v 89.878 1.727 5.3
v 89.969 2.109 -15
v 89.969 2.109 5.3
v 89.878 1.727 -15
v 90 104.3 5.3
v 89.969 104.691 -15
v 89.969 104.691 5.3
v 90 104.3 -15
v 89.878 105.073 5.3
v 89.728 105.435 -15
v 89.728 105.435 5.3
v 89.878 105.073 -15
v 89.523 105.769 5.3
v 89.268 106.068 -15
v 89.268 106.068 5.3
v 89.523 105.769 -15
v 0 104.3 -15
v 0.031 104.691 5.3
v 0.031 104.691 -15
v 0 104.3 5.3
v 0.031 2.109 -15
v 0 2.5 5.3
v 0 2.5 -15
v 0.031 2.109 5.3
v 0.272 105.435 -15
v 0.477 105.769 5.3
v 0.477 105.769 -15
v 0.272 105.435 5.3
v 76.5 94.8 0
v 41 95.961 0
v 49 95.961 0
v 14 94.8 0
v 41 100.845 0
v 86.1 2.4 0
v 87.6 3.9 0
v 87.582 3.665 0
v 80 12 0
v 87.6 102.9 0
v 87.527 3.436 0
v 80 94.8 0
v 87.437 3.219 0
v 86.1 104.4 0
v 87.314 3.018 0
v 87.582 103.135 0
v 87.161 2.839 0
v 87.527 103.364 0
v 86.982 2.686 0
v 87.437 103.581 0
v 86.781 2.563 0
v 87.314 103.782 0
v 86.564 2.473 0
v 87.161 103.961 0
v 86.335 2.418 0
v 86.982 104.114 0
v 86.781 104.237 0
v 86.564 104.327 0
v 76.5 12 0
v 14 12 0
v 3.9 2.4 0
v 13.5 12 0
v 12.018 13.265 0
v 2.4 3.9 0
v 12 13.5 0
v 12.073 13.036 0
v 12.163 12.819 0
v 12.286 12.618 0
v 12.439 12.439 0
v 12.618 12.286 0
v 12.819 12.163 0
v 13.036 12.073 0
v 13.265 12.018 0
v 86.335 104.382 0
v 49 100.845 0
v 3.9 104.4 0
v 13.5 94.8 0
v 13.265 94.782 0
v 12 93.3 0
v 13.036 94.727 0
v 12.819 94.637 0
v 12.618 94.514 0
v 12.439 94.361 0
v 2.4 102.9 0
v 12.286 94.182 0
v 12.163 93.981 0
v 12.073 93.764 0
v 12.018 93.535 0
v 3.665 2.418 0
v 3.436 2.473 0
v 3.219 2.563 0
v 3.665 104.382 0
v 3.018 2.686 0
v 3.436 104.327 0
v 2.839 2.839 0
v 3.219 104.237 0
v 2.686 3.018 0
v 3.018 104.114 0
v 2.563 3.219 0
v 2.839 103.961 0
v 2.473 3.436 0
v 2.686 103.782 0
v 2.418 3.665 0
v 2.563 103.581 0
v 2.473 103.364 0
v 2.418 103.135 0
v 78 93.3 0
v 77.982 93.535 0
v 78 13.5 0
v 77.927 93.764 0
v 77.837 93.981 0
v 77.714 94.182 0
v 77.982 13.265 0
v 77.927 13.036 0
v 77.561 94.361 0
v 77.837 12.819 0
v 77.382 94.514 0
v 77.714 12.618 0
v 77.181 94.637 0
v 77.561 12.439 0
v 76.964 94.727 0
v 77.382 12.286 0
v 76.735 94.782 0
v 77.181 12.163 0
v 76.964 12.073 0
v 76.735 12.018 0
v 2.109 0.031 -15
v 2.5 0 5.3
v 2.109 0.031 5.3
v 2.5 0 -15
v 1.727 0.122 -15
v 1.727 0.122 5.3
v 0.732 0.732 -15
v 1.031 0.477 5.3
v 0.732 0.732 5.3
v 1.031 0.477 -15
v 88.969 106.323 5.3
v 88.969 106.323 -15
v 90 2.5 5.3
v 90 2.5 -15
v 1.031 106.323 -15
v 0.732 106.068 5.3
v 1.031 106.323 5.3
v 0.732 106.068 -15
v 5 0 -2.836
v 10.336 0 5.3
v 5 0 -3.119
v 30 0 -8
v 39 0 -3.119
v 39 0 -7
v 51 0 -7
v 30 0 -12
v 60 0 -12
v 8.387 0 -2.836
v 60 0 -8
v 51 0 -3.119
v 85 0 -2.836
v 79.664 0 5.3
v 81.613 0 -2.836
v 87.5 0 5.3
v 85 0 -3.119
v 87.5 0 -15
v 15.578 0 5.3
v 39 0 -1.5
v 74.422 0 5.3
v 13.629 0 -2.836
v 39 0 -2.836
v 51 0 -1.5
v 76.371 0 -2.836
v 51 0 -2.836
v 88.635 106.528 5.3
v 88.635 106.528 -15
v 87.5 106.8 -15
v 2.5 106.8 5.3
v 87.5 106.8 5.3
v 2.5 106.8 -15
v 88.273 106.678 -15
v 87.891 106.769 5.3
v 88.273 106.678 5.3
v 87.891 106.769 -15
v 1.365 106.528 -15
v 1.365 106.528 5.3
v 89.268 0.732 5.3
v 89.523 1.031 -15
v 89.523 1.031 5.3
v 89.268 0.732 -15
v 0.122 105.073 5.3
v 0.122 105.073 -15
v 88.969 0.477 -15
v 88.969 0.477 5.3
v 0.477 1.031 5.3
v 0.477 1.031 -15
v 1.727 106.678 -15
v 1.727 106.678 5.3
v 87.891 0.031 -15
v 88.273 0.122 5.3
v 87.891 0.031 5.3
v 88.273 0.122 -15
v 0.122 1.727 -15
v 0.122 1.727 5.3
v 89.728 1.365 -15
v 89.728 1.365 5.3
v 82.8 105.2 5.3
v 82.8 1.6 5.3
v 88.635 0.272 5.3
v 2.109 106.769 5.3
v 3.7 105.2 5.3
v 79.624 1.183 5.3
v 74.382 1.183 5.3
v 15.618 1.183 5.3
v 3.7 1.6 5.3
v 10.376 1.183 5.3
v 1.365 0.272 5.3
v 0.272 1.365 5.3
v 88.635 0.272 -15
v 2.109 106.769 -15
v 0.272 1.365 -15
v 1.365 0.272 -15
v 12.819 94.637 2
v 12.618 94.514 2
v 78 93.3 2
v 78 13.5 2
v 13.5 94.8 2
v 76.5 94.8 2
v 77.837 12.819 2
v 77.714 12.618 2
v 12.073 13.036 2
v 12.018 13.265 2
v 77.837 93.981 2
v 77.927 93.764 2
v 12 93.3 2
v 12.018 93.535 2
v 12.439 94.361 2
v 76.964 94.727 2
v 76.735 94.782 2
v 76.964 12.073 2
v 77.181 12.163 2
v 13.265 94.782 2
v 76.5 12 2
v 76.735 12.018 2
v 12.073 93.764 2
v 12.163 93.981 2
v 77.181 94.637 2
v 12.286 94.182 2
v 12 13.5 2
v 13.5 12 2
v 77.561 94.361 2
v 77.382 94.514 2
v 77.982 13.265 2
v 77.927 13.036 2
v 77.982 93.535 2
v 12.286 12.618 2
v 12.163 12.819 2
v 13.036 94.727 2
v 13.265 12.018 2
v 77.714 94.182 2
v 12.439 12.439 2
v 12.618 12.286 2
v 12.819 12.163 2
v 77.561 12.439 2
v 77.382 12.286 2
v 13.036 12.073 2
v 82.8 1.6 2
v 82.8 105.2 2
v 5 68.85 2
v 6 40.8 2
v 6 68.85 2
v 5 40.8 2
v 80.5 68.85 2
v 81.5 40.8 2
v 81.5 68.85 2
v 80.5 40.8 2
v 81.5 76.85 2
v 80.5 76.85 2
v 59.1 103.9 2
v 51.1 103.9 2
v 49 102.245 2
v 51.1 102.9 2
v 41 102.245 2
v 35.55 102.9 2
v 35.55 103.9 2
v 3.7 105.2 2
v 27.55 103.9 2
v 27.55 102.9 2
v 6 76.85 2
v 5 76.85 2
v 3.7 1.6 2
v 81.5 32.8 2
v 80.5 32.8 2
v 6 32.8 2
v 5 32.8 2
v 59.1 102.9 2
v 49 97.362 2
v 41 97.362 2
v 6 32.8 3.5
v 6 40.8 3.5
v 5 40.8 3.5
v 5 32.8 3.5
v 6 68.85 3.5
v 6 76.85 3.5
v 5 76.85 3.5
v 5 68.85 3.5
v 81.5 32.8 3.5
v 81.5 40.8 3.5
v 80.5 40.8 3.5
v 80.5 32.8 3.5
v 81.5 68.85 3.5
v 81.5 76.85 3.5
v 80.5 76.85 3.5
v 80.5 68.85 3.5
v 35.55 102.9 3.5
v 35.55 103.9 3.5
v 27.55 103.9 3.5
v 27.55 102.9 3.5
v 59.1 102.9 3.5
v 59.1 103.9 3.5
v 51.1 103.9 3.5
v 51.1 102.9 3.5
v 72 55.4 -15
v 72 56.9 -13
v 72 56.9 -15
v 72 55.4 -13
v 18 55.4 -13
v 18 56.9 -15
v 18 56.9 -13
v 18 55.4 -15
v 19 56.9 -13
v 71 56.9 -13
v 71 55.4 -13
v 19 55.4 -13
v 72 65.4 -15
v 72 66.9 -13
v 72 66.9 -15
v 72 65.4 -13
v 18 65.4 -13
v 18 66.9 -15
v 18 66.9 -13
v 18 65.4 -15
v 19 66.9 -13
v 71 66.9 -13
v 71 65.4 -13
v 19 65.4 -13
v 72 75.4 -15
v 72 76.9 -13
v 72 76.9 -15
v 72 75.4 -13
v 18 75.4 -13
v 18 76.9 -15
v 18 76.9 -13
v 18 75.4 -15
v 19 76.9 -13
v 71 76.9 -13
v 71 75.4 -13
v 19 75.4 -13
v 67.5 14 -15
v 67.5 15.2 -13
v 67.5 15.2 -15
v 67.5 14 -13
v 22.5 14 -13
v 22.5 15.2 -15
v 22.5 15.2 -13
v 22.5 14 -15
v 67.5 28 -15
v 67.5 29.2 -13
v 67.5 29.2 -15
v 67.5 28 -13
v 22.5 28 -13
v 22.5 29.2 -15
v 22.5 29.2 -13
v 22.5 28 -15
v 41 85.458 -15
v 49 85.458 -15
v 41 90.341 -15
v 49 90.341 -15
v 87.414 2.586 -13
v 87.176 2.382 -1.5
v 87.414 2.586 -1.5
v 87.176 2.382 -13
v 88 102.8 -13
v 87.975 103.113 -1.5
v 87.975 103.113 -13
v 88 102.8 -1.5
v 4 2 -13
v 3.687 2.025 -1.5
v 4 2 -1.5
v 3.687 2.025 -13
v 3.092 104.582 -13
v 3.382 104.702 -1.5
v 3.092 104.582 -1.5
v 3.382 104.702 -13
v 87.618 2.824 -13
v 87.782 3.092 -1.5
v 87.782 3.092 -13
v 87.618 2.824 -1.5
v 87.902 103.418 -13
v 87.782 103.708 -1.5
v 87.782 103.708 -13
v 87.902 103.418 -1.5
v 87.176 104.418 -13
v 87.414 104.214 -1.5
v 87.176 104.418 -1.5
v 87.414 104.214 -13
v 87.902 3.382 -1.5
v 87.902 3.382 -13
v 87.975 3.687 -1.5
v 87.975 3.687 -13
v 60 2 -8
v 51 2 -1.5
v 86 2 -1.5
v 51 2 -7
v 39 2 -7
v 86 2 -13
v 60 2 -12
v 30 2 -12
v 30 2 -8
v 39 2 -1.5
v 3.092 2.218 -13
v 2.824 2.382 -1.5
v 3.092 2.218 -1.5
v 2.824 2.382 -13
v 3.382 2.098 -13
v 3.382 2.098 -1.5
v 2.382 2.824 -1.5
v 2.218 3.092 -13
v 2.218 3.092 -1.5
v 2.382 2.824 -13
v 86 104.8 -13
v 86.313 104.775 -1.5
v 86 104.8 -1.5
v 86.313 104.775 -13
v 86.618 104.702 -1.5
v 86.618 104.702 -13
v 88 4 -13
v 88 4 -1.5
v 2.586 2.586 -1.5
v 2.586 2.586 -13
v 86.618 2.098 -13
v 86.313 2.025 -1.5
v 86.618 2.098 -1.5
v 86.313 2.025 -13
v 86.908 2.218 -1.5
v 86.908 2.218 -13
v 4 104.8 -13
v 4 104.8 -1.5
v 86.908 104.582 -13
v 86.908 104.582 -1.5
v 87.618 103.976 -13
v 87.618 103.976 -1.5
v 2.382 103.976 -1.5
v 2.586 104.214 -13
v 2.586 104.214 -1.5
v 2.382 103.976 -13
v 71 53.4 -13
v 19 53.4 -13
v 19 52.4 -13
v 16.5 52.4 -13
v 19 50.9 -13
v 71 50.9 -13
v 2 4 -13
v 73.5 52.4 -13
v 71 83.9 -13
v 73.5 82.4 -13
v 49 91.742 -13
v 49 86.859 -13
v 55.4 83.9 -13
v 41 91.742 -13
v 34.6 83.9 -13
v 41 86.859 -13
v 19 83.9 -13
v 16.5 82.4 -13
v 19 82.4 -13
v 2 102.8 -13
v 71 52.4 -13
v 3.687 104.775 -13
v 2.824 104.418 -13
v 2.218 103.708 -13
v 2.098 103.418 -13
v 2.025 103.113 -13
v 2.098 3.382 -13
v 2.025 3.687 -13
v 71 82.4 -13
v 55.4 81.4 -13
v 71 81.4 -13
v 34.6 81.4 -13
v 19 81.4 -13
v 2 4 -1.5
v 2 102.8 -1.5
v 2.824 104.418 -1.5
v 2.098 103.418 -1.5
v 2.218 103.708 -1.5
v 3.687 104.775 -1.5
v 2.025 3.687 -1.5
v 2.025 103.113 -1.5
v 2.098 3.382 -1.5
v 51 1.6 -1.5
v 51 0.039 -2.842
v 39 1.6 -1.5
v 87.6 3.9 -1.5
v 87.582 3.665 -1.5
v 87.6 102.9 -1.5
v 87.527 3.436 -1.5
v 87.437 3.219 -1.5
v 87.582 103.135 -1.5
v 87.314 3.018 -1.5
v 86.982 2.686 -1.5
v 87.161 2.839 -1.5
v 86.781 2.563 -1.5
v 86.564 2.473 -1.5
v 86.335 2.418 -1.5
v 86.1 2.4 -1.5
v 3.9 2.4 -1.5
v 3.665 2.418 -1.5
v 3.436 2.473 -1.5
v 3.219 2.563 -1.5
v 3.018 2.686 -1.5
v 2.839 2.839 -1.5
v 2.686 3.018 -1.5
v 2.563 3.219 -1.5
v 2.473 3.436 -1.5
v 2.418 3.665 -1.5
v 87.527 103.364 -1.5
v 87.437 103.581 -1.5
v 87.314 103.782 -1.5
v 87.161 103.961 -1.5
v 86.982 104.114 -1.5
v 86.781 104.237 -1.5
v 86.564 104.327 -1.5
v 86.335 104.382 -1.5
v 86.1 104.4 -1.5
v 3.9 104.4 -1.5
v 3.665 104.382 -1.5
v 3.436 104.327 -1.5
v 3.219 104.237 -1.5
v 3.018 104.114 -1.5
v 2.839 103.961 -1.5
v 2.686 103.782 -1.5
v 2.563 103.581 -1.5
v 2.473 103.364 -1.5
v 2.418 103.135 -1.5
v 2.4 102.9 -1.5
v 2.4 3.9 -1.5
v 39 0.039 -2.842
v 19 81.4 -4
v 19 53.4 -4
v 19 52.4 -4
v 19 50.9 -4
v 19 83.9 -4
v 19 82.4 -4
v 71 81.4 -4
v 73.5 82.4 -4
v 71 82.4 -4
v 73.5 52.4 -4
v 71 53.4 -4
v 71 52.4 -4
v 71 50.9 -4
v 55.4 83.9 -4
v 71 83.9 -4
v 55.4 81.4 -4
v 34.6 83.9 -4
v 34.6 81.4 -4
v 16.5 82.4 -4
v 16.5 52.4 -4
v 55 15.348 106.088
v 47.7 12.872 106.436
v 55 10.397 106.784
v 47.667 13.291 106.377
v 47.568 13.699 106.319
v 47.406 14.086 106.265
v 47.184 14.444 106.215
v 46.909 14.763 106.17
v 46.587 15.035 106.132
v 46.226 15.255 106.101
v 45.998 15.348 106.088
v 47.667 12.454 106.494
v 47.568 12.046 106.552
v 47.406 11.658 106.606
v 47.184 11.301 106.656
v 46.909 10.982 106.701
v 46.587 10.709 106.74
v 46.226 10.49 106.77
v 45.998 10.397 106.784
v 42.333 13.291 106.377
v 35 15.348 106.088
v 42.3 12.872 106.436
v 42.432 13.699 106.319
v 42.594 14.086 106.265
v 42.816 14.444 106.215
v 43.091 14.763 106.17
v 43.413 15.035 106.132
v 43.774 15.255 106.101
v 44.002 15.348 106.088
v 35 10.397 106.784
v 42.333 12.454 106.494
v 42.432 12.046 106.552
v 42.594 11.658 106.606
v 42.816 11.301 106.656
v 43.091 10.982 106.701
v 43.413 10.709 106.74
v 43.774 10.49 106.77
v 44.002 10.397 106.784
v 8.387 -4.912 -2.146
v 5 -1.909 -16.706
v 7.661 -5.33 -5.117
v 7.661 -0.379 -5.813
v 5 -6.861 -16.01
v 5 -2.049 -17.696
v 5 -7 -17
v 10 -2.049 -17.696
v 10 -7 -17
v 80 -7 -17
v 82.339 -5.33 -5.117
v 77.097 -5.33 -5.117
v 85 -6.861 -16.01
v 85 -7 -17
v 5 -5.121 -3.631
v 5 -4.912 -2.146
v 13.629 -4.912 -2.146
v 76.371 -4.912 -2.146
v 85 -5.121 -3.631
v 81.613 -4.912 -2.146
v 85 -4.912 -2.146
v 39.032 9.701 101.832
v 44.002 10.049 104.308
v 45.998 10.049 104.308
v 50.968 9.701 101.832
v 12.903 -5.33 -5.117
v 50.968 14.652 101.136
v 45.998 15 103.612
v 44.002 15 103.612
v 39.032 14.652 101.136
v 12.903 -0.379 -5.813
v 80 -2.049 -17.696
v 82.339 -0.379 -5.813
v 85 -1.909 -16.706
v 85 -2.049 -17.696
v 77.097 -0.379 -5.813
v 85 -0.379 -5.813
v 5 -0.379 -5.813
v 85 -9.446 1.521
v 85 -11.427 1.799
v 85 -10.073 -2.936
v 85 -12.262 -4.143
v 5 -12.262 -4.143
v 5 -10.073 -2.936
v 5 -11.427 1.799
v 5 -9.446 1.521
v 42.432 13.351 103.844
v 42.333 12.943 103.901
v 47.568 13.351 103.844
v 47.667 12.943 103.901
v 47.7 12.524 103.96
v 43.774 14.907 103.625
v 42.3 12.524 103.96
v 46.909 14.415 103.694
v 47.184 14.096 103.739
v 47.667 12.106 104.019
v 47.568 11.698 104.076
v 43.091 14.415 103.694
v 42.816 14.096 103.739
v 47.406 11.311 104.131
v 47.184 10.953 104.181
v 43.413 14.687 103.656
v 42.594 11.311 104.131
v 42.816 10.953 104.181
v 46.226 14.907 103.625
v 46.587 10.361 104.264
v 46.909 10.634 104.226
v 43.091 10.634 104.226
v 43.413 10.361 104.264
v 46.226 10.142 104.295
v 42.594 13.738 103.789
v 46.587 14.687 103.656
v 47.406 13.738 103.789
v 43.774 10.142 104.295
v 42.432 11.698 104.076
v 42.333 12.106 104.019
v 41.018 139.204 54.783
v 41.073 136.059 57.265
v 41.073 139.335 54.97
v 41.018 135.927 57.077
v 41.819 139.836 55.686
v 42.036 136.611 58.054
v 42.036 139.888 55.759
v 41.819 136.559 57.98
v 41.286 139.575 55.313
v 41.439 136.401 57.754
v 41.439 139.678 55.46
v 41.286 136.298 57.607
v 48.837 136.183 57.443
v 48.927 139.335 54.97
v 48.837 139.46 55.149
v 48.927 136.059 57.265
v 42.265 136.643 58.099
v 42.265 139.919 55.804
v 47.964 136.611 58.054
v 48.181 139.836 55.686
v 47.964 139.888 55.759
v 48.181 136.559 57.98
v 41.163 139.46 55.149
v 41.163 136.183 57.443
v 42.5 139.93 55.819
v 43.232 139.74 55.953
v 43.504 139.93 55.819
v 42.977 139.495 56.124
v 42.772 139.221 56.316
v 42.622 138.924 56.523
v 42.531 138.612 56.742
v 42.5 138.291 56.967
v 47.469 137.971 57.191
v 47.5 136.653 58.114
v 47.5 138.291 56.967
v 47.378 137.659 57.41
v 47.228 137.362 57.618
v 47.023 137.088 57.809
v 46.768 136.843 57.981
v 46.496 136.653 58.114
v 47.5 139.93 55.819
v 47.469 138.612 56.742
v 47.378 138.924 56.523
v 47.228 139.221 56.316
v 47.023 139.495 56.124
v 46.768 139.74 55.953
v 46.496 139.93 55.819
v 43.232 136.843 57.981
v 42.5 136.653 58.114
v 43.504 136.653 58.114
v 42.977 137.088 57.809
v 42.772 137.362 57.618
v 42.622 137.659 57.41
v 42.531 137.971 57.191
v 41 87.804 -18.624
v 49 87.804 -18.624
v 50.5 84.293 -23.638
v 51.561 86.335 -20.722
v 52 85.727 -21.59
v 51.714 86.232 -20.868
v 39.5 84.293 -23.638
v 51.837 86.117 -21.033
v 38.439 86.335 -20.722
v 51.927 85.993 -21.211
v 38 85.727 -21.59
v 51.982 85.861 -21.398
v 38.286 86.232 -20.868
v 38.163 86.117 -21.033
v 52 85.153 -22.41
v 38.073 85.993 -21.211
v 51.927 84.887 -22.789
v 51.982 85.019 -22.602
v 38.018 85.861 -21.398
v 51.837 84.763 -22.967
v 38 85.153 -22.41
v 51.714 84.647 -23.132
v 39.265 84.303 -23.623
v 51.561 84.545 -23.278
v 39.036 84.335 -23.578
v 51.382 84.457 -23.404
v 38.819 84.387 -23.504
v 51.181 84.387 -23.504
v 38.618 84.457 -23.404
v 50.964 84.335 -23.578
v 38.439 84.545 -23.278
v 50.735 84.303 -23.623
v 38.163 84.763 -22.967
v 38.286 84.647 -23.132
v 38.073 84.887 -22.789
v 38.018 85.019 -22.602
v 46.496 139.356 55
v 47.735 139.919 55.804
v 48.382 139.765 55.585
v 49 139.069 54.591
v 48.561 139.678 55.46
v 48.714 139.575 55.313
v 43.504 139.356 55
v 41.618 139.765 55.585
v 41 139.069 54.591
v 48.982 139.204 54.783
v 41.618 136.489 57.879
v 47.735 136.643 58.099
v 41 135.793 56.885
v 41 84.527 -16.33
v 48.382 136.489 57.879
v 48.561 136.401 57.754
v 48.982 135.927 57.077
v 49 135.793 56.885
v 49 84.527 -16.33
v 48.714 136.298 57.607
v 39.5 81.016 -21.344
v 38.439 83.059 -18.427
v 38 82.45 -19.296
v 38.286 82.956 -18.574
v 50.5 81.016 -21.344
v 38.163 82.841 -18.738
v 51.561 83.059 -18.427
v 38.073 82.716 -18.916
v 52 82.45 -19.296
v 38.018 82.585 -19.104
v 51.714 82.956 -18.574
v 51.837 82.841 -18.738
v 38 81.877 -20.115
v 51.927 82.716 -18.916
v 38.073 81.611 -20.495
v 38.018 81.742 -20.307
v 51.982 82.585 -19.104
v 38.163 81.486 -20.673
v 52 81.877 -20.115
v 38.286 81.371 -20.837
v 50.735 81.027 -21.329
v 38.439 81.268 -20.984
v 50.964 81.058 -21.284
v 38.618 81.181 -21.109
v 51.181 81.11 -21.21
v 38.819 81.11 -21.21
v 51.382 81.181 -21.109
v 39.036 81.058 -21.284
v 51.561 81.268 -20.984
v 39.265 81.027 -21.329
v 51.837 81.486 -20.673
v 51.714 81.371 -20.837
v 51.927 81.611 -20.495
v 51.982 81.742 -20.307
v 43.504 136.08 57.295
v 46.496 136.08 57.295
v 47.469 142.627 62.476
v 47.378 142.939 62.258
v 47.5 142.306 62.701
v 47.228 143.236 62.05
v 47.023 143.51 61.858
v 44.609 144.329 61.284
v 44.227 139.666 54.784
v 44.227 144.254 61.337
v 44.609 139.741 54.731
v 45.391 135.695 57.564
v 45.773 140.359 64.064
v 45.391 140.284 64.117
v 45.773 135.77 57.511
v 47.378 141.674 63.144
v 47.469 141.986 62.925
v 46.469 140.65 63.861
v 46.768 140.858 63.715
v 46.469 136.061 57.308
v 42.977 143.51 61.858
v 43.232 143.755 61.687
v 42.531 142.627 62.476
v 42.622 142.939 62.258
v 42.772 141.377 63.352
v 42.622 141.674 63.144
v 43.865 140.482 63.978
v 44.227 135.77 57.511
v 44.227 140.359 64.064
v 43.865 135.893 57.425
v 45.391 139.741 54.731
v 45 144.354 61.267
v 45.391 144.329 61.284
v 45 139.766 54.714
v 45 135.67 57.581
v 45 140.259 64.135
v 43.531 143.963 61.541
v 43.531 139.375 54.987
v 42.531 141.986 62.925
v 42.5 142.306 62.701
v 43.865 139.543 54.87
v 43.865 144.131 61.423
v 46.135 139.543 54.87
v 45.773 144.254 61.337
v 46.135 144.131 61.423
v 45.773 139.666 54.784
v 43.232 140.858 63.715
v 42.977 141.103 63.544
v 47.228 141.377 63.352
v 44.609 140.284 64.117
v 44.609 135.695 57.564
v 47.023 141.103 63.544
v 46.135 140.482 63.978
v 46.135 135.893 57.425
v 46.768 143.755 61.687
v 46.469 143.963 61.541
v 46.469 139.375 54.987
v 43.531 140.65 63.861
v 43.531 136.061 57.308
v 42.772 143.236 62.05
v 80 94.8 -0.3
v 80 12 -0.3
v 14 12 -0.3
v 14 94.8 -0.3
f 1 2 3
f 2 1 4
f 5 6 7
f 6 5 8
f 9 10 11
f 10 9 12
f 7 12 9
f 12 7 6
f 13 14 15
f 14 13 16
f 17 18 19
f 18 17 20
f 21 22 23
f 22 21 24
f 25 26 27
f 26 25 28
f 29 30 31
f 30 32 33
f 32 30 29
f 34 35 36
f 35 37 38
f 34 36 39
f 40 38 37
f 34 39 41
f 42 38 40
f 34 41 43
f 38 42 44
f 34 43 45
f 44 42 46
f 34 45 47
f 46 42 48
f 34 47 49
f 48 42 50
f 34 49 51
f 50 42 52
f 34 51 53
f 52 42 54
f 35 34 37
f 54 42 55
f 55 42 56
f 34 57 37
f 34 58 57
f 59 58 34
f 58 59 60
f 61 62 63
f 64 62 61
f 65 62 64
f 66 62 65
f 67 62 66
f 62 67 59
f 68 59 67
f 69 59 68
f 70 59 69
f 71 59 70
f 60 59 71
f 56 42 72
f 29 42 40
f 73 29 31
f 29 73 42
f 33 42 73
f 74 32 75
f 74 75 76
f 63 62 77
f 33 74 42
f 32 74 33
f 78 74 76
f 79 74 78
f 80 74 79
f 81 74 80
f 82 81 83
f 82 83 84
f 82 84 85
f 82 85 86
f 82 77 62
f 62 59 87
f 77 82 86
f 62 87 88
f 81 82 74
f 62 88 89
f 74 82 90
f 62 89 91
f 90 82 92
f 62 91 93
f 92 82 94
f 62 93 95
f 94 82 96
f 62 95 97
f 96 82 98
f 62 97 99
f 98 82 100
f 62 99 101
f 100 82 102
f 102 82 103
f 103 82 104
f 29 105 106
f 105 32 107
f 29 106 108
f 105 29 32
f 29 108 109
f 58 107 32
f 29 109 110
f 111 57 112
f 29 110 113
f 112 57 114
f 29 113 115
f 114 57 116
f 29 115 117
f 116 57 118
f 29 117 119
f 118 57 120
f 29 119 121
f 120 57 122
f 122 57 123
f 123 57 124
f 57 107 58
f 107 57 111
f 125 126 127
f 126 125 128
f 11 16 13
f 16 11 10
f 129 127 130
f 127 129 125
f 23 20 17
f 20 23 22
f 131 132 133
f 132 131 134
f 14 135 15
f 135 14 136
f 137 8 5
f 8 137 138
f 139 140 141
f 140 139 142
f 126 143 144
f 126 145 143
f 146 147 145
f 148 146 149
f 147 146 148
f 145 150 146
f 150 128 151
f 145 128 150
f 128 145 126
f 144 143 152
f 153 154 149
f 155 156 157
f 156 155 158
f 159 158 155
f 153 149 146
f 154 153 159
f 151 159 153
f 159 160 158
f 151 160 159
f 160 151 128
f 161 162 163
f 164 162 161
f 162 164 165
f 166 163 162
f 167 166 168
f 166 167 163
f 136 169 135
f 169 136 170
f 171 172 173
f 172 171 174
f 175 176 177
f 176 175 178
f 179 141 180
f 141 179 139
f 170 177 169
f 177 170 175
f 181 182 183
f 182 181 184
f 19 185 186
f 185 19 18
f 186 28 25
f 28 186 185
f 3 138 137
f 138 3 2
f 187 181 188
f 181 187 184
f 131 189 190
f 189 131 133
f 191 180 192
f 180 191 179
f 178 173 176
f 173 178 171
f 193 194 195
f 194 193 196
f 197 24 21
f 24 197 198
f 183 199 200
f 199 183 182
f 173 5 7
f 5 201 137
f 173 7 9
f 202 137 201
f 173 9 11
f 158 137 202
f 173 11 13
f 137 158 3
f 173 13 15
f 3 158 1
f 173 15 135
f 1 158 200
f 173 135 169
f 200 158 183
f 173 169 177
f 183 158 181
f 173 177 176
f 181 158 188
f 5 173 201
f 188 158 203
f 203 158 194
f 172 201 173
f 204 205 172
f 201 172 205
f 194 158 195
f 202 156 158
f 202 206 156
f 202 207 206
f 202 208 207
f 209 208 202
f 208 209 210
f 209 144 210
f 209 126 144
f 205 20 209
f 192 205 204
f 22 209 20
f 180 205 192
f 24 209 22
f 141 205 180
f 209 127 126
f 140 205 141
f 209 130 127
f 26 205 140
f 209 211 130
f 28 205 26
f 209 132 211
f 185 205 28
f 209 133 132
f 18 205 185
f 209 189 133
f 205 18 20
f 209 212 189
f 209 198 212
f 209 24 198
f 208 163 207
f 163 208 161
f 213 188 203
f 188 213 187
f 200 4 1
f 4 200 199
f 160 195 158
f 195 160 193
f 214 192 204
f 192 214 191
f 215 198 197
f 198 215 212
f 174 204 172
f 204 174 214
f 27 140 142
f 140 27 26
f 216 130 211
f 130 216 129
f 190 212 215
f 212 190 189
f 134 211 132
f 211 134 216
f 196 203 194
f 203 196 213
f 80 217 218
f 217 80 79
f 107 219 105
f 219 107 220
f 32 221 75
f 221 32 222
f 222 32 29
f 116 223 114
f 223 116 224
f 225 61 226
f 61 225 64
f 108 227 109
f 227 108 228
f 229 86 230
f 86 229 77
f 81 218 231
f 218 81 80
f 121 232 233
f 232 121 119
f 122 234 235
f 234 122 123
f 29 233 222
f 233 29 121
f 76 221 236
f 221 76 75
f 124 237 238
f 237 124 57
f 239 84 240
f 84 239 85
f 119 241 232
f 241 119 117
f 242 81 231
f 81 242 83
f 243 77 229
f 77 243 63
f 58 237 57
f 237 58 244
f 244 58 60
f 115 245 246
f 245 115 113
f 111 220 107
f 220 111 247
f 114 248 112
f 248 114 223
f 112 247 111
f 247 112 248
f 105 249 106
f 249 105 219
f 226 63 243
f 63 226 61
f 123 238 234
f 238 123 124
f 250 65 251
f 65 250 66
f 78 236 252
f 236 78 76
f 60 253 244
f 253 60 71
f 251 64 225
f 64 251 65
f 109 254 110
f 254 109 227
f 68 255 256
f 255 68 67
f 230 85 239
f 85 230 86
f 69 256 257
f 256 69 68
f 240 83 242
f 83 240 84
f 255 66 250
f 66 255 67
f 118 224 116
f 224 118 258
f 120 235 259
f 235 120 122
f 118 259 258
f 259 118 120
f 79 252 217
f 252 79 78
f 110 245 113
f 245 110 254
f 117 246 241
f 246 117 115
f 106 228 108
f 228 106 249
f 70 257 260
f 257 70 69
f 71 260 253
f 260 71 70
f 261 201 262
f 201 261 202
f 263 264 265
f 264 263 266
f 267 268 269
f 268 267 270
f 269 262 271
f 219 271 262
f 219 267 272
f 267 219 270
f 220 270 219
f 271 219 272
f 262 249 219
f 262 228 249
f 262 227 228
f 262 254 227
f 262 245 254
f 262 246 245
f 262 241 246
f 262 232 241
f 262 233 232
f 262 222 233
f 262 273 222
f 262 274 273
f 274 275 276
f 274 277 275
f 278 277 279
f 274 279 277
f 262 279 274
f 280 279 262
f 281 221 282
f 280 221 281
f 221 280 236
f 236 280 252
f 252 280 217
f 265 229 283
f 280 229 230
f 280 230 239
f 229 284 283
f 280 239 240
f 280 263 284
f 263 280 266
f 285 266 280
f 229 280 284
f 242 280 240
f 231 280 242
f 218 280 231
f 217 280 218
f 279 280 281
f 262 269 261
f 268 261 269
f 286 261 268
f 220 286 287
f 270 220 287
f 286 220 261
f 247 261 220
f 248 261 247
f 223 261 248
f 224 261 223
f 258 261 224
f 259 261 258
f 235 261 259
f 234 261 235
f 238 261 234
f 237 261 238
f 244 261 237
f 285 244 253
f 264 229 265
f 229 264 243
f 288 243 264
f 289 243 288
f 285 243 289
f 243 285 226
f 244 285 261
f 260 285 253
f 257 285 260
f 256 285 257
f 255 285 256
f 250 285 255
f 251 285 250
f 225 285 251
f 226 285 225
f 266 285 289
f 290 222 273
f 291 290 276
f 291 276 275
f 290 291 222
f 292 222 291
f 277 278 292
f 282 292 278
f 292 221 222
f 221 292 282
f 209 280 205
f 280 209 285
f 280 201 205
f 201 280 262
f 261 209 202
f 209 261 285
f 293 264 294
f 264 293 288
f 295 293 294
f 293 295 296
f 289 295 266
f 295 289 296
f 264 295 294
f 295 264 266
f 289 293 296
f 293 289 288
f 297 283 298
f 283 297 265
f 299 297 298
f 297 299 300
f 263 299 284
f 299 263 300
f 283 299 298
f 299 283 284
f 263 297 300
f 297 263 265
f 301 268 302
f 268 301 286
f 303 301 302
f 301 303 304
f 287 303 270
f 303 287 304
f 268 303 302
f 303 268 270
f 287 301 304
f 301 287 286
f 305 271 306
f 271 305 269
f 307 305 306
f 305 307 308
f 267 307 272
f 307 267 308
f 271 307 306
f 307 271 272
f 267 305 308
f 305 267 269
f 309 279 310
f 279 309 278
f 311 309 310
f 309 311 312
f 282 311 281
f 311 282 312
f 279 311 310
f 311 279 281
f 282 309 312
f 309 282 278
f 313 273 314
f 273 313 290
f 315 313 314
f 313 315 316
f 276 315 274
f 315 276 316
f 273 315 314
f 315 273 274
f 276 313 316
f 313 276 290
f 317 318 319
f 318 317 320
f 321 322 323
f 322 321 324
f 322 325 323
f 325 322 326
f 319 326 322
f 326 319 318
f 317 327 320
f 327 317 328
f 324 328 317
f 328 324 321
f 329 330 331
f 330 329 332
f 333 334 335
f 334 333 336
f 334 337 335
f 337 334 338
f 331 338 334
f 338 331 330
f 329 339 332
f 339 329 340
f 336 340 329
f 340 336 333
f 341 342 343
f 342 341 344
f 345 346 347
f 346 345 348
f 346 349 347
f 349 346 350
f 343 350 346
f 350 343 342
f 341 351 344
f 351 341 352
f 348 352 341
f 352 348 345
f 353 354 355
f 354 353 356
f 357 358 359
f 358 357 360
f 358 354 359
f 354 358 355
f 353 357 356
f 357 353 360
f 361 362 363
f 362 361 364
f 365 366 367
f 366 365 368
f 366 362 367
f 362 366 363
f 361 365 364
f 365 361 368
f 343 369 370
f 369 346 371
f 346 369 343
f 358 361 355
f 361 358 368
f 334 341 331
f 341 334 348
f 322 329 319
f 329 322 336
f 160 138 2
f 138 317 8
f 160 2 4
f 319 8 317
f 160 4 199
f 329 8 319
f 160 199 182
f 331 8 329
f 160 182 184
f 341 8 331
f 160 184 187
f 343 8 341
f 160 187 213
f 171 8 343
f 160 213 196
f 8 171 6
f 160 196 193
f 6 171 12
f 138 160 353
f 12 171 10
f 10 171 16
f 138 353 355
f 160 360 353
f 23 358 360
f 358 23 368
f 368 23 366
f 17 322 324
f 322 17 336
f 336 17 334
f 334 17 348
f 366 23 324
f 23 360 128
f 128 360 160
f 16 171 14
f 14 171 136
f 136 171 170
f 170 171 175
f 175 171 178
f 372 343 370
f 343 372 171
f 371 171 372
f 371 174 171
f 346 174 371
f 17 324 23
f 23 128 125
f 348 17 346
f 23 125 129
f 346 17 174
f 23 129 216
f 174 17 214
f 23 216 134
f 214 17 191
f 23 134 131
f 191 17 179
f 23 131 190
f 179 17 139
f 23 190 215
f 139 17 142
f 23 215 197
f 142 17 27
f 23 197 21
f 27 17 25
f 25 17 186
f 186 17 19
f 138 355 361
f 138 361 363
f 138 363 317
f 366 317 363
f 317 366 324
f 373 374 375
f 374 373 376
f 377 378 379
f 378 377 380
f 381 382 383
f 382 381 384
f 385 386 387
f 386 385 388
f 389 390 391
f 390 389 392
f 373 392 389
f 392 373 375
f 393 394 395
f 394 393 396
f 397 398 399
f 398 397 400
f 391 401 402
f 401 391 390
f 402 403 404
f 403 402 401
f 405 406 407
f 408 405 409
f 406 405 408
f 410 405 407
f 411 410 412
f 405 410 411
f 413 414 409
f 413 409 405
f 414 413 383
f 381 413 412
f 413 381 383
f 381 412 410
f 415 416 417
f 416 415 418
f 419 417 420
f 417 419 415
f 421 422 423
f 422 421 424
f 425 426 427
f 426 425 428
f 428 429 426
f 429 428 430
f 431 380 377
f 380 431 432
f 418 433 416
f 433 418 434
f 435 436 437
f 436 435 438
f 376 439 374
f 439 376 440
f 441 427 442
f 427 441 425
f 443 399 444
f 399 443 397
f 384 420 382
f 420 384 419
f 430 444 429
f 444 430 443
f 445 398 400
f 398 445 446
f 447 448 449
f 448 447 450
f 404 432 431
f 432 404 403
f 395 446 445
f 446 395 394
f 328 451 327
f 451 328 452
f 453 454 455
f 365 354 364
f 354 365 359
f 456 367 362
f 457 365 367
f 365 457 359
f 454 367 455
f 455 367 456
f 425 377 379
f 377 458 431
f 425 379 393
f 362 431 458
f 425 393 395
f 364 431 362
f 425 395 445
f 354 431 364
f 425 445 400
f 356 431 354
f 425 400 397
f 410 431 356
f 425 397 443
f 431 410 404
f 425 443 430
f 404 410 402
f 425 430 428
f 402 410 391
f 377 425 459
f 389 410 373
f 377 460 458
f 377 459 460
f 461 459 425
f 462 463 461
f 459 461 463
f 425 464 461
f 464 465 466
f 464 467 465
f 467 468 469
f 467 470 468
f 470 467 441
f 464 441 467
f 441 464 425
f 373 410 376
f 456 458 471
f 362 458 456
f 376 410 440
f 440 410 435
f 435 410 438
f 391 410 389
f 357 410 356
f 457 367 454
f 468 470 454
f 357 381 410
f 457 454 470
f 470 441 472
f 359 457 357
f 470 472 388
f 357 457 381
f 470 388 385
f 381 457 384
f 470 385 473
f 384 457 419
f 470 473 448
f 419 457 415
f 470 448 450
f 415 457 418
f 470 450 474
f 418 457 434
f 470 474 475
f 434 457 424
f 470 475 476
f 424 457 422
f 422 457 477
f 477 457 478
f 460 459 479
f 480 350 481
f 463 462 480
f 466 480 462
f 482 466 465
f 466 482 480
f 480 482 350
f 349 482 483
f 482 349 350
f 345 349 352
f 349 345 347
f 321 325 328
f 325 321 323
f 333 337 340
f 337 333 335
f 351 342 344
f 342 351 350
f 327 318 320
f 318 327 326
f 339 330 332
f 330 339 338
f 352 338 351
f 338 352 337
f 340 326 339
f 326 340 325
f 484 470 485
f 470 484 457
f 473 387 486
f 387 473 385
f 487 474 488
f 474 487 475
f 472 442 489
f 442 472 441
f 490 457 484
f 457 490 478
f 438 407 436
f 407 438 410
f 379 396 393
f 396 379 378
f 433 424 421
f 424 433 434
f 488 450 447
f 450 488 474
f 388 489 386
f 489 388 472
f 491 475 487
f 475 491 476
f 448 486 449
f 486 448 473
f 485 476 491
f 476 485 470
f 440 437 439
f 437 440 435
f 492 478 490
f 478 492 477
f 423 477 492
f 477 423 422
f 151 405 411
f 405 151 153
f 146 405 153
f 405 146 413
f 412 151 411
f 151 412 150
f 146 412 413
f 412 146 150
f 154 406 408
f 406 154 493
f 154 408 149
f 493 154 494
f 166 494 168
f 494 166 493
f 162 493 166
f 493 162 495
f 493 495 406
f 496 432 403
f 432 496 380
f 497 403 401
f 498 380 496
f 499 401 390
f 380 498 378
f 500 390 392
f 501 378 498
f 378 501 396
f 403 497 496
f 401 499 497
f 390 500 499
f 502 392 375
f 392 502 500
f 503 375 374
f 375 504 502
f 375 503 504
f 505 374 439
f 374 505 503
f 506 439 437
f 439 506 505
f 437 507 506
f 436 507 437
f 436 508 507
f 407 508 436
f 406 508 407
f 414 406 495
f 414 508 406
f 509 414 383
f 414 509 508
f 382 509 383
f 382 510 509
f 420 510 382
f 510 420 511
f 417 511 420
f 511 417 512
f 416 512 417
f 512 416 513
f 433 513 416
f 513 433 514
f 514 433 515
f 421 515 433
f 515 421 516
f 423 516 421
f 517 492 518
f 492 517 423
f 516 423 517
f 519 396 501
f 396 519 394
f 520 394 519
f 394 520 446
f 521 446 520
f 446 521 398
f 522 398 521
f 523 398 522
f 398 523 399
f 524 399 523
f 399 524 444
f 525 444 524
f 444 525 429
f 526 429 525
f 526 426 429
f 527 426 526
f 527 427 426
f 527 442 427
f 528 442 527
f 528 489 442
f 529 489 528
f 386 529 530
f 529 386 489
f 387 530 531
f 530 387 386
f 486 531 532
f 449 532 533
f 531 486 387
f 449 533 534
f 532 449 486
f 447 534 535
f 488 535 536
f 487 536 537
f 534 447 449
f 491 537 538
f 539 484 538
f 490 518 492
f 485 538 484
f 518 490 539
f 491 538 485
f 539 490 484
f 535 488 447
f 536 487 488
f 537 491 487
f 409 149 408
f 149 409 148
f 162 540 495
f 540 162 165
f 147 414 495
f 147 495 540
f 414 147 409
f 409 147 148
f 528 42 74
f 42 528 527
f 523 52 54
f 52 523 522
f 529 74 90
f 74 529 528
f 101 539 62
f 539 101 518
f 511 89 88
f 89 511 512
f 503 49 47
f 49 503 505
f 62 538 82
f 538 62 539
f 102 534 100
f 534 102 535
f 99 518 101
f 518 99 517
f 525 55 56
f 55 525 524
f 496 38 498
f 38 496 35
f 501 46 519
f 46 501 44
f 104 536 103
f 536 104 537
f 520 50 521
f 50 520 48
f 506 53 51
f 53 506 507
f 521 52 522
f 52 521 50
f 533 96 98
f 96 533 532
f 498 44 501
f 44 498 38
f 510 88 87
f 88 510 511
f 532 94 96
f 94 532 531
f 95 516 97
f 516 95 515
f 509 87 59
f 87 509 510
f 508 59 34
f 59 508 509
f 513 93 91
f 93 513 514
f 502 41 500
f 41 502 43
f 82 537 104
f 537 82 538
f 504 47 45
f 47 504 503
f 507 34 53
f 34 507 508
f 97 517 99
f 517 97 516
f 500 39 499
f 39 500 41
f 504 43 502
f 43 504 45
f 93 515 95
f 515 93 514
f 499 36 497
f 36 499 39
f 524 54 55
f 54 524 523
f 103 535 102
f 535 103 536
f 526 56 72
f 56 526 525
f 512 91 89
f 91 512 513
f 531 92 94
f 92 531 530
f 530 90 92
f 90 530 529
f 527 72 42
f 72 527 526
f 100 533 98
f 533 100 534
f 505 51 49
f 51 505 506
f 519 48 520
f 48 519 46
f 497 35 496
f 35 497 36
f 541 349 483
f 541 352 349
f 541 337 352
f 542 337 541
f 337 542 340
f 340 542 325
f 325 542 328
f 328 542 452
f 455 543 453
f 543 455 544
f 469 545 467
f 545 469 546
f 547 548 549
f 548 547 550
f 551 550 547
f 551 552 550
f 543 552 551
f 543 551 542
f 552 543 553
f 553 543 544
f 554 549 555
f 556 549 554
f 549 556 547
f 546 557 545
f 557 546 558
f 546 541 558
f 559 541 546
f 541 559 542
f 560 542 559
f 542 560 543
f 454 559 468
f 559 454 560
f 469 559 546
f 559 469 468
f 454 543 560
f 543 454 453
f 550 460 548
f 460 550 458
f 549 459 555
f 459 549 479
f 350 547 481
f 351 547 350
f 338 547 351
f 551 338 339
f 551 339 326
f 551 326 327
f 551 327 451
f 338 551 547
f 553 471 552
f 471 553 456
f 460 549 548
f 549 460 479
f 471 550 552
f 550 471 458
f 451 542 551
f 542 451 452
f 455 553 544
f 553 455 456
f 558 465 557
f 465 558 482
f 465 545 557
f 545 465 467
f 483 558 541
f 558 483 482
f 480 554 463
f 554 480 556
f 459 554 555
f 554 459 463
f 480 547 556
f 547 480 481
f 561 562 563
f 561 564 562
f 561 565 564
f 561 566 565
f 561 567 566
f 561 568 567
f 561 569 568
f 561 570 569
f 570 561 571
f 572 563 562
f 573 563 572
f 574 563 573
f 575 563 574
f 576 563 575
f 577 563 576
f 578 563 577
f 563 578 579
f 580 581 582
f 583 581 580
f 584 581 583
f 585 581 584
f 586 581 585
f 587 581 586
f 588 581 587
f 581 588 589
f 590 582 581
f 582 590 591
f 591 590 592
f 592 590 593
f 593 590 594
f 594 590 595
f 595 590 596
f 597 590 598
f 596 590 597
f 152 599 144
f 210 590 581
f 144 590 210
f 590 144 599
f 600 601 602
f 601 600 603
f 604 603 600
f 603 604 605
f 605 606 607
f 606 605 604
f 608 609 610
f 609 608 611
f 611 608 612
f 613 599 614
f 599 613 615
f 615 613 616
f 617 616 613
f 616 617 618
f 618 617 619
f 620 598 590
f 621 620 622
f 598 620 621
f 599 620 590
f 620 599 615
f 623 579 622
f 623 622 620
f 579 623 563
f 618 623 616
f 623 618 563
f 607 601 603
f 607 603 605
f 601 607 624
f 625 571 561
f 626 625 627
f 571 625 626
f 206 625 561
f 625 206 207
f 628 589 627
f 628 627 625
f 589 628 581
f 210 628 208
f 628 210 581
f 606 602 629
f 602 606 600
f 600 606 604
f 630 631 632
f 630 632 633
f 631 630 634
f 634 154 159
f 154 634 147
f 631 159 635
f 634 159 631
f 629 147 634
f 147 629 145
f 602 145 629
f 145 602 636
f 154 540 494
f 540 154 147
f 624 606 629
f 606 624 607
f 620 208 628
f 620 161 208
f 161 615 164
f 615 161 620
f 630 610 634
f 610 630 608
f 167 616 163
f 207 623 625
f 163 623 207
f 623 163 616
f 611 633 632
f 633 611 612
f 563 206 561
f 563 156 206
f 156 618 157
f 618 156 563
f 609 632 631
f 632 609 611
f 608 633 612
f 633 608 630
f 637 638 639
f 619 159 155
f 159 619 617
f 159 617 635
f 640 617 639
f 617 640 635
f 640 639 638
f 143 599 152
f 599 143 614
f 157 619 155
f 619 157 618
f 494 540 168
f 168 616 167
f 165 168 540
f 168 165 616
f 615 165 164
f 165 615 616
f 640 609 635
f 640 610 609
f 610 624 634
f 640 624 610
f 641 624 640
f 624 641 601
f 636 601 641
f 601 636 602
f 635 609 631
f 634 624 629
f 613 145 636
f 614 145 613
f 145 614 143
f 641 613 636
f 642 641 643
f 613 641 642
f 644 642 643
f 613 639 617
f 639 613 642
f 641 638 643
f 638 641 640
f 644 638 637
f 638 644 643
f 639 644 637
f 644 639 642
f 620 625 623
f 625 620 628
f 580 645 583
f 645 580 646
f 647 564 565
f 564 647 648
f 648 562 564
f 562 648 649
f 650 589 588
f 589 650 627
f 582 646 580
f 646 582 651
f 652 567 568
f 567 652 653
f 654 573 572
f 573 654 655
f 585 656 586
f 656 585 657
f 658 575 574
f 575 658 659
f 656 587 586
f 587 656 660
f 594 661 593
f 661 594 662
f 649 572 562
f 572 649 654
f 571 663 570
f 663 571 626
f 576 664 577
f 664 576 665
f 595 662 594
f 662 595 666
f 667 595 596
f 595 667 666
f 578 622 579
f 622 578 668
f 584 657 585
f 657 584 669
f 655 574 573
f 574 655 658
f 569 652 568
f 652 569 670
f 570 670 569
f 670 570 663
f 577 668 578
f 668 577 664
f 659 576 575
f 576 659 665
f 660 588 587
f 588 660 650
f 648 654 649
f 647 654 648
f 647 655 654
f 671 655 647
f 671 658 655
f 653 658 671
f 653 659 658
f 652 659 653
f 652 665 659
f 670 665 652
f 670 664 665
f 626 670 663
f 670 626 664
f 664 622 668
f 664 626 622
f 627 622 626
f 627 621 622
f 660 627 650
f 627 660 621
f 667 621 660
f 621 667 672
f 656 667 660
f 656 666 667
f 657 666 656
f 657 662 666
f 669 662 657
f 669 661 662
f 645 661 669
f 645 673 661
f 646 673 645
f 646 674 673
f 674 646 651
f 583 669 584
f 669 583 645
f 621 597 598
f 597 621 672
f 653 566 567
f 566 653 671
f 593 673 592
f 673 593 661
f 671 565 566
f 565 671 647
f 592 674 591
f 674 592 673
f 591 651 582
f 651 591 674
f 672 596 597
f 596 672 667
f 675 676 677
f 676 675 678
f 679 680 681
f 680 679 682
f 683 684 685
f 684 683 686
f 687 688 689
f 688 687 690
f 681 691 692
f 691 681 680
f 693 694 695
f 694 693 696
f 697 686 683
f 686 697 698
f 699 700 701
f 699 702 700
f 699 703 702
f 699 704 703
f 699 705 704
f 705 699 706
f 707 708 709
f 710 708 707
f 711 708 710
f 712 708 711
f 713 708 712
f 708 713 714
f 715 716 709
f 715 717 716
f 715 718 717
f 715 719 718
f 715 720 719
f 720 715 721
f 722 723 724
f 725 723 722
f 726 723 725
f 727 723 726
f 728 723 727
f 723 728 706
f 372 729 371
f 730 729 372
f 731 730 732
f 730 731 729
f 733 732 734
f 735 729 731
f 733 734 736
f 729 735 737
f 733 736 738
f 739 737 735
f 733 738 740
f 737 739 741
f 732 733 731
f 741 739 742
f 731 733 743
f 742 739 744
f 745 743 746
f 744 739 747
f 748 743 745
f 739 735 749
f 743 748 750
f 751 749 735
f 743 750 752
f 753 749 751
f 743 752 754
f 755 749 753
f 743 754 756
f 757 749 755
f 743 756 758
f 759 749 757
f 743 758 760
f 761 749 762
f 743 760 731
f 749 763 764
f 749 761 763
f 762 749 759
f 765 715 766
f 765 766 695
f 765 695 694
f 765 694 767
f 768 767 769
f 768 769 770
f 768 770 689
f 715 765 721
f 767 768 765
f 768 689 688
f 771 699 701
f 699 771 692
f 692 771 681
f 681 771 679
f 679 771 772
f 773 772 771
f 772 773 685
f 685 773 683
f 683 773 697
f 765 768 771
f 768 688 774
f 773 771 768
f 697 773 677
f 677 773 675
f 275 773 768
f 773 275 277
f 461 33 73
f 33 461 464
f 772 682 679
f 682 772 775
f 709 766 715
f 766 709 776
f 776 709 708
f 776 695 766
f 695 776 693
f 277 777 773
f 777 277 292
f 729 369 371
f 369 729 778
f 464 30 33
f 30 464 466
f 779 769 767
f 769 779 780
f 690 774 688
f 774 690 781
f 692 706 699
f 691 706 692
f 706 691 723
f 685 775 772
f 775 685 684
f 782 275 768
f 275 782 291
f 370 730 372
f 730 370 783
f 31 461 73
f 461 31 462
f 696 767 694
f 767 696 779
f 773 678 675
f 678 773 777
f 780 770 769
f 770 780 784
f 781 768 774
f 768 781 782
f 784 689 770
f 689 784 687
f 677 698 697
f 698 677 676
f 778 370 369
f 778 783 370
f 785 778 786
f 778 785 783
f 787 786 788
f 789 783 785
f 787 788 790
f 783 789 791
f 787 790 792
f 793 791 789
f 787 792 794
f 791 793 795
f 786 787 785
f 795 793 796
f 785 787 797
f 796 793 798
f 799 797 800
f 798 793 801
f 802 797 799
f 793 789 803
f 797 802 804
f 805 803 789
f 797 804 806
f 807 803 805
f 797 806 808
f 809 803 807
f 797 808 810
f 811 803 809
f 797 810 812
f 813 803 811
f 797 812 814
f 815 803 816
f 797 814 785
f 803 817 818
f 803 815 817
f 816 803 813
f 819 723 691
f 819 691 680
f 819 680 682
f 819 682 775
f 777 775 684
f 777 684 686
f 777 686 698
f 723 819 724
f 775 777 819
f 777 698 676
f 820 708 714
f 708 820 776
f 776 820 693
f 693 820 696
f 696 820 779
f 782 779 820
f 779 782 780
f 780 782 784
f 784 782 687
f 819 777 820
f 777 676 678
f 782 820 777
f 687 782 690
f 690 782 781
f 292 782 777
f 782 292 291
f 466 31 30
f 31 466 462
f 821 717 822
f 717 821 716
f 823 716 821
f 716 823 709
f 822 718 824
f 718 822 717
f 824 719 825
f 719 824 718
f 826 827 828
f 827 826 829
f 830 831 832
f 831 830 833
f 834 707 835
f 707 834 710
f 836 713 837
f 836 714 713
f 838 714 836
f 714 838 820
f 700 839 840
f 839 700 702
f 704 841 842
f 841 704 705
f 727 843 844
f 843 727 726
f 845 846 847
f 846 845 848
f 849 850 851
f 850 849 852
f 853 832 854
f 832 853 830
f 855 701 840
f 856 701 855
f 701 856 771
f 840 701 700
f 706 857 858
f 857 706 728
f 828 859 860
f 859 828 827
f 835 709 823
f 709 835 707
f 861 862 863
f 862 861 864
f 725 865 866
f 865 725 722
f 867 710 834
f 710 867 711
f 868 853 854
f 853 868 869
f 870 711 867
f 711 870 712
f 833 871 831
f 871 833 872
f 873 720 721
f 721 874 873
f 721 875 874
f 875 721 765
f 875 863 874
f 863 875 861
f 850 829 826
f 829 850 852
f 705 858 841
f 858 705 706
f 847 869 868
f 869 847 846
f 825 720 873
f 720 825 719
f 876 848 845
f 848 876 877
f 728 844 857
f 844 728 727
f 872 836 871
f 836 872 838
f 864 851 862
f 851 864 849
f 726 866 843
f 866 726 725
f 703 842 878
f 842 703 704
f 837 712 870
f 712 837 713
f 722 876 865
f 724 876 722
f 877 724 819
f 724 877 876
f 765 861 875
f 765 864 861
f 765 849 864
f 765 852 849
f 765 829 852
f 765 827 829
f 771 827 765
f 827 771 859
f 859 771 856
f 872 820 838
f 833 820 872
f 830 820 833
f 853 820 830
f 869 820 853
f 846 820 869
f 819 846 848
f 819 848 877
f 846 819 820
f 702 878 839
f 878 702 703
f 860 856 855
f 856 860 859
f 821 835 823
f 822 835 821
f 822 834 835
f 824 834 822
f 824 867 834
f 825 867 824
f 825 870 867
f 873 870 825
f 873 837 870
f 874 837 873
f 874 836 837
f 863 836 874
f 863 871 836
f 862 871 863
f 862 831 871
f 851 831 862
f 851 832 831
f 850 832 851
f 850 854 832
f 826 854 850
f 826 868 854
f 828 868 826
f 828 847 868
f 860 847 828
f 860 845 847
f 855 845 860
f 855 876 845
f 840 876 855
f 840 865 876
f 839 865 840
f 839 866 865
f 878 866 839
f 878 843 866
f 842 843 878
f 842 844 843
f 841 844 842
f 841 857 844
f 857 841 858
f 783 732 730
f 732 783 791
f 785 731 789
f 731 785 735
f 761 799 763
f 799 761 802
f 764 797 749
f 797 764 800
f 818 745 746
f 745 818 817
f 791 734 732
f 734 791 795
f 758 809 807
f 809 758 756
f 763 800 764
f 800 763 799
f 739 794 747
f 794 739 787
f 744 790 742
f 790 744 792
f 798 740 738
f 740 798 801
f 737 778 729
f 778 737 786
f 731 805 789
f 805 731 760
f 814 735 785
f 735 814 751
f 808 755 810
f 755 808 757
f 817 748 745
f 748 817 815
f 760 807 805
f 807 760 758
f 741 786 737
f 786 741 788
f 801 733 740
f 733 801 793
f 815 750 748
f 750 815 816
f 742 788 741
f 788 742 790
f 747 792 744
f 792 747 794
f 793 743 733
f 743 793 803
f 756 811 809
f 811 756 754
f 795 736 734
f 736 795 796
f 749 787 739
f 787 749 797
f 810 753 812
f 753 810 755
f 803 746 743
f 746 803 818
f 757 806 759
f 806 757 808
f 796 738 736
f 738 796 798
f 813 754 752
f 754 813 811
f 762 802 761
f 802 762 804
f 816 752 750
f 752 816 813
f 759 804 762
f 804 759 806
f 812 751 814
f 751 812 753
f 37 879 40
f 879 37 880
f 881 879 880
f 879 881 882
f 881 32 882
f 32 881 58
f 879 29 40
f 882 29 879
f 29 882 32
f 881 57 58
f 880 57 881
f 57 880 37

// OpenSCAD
// ePaper Art Device — Portrait Mini Easel Enclosure v2
// Parametric OpenSCAD model for FDM 3D printing
//
// ORIENTATION: Portrait (ribbon at bottom, short side)
//   Display: 68mm wide, biased right on PCB (9mm dead left)
//   Frame has EVEN bezel centered on display, not PCB
//
// THREE PRINTED PARTS:
//   1. Front frame  — picture frame with centered window
//   2. Back shell   — holds ESP32, snaps onto frame
//   3. Easel stand  — classic 2-front-leg + 1-back-leg easel
//
// Set render_part below to export each STL
//
// ═══════════════════════════════════════════════════════════

$fn = 40;

// ───────────────────────────────────────────
//  MODULE DIMENSIONS (from actual hardware)
// ───────────────────────────────────────────

// Waveshare 4.2" module — portrait orientation
pcb_w     = 78.5;          // Shorter side (ribbon here)
pcb_h     = 103.0;         // Longer side (portrait tall)
pcb_d     = 1.6;           // PCB thickness
glass_d   = 1.2;           // Glass panel above PCB

// Display active area (portrait)
disp_w    = 68.0;          // Active width
disp_h    = 84.8;          // Active height
dead_left = 9.0;           // Dead space on left (cabling)
// Right dead space: pcb_w - dead_left - disp_w = 1.5mm

// Display center relative to PCB left edge
disp_center_on_pcb = dead_left + disp_w / 2;  // = 43mm

// ESP32 DevKit V1
esp_w     = 52.0;
esp_h     = 28.0;
esp_d     = 10.0;
usb_w     = 8.0;
usb_h     = 3.5;

// ───────────────────────────────────────────
//  ENCLOSURE PARAMETERS
// ───────────────────────────────────────────

wall      = 2.0;           // Wall thickness
tol       = 0.3;           // Print tolerance
corner_r  = 2.5;           // Corner rounding

// Bezel: even visual border around display window
bezel     = 12.0;          // Visible bezel width (all sides)
overlap   = 1.0;           // How much bezel overlaps display glass edge

// Display window size (slightly smaller than active area)
win_w     = disp_w - overlap * 2;   // 66mm
win_h     = disp_h - overlap * 2;   // 82.8mm

// Frame outer size — centered on display window
frame_w   = win_w + bezel * 2;      // 90mm
frame_h   = win_h + bezel * 2;      // 106.8mm

// Window position (centered in frame)
win_x     = bezel;                   // 12mm from left
win_y     = bezel;                   // 12mm from bottom

// Where the PCB sits in frame coordinates
// Display left in frame = win_x + overlap = 13mm
// Display left on PCB = dead_left = 9mm
// So PCB left edge in frame = 13 - 9 = 4mm
pcb_x     = win_x + overlap - dead_left;     // ~4mm
pcb_y     = (frame_h - pcb_h) / 2;           // centered vertically

// Frame depths
front_d   = wall + glass_d + pcb_d + 0.5;    // ~5.3mm
back_d    = 13.0;                              // Interior depth for ESP32 + wires

// Ribbon cable slot
ribbon_w  = 30.0;
ribbon_h  = 3.0;

// ───────────────────────────────────────────
//  WHICH PART TO RENDER
// ───────────────────────────────────────────
// "front", "back", "easel_front", "easel_back", or "all"
render_part = "all";

// ───────────────────────────────────────────
//  EASEL PARAMETERS  
// ───────────────────────────────────────────

// Front A-frame
leg_section   = 5.0;        // Leg cross-section (square with rounded edges)
leg_height    = 125.0;      // Total leg height
bottom_spread = 80.0;       // Leg spacing at bottom (> frame_w for stability)
top_spread    = 20.0;       // Leg spacing at top (converging)
shelf_h       = 12.0;       // Height of shelf from bottom of legs
shelf_lip     = 7.0;        // How far shelf sticks forward
shelf_thick   = 3.0;        // Shelf thickness

// Back support leg
back_leg_len  = 95.0;       // Back leg length
back_leg_w    = 8.0;        // Back leg width
back_leg_d    = 4.0;        // Back leg thickness
peg_r         = 2.5;        // Peg radius for joint
peg_len       = 8.0;        // Peg insertion depth

// ═══════════════════════════════════════════════════════════
//  UTILITY
// ═══════════════════════════════════════════════════════════

module rrect(w, h, d, r) {
    hull() {
        translate([r, r, 0])     cylinder(d, r, r);
        translate([w-r, r, 0])   cylinder(d, r, r);
        translate([r, h-r, 0])   cylinder(d, r, r);
        translate([w-r, h-r, 0]) cylinder(d, r, r);
    }
}

// ═══════════════════════════════════════════════════════════
//  1. FRONT FRAME — Picture frame face
// ═══════════════════════════════════════════════════════════

module front_frame() {
    difference() {
        // Solid frame body
        rrect(frame_w, frame_h, front_d, corner_r);

        // Display window (centered — this is the key!)
        translate([win_x, win_y, -0.1])
            rrect(win_w, win_h, front_d + 0.2, 1.5);

        // PCB pocket (from the back)
        // Sized to hold the full PCB with tolerance
        translate([pcb_x - tol, pcb_y - tol, wall])
            cube([pcb_w + tol*2, pcb_h + tol*2, front_d]);
    }

    // Retaining clips (hold glass against front wall)
    clip_h = glass_d + 0.3;
    clip_t = 1.0;
    clip_len = 8.0;

    // Left side clips (in the dead space — won't interfere with display)
    translate([pcb_x + 1, pcb_y + pcb_h * 0.3, wall])
        cube([clip_t, clip_len, clip_h]);
    translate([pcb_x + 1, pcb_y + pcb_h * 0.65, wall])
        cube([clip_t, clip_len, clip_h]);

    // Right side clips
    translate([pcb_x + pcb_w - 1 - clip_t, pcb_y + pcb_h * 0.3, wall])
        cube([clip_t, clip_len, clip_h]);
    translate([pcb_x + pcb_w - 1 - clip_t, pcb_y + pcb_h * 0.65, wall])
        cube([clip_t, clip_len, clip_h]);

    // Top clips
    translate([pcb_x + pcb_w * 0.3, pcb_y + pcb_h - 2, wall])
        cube([clip_len, clip_t, clip_h]);
    translate([pcb_x + pcb_w * 0.6, pcb_y + pcb_h - 2, wall])
        cube([clip_len, clip_t, clip_h]);
}

// ═══════════════════════════════════════════════════════════
//  2. BACK SHELL — Holds ESP32 and wiring
// ═══════════════════════════════════════════════════════════

module back_shell() {
    shell_d = back_d + wall;

    // ESP32 positioned in upper half — clear of ribbon area
    bracket_h = 9.0;       // Slightly taller (+1mm)
    bracket_t = 2.5;       // Slightly thicker (+0.5mm)
    esp_x = (frame_w - esp_w) / 2;  // Centered horizontally
    esp_y = frame_h * 0.5;          // Upper half of shell

    difference() {
        // Outer shell
        rrect(frame_w, frame_h, shell_d, corner_r);

        // Hollow interior
        translate([wall, wall, wall])
            rrect(frame_w - wall*2, frame_h - wall*2, shell_d, corner_r - 0.5);

        // ── Ribbon cable slot (bottom center) ──
        // Now clear — ESP32 is up top
        translate([(frame_w - ribbon_w) / 2, -0.1, wall + 1])
            cube([ribbon_w, wall + 0.2, ribbon_h + 1]);

        // ── USB cable slot (bottom, centered on ESP32) ──
        // Aligned with ESP32's USB port (centered X)
        // Cable routes up inside the shell to the ESP32
        usb_slot_x = (frame_w - usb_w - 4) / 2;
        translate([usb_slot_x, -0.1, wall + ribbon_h + 3])
            cube([usb_w + 4, wall + 0.2, usb_h + 2]);

        // ── Vent slots behind ESP32 (upper area) ──
        for (i = [0:2]) {
            translate([frame_w * 0.2, esp_y + 2 + i * 10, -0.1])
                cube([frame_w * 0.6, 1.5, wall + 0.2]);
        }

        // ── Lower vent slots (general airflow) ──
        for (i = [0:1]) {
            translate([frame_w * 0.25, wall + 12 + i * 14, -0.1])
                cube([frame_w * 0.5, 1.2, wall + 0.2]);
        }
    }

    // ── Snap-fit lip (mates with front frame) ──
    lip_h = 1.5;
    lip_t = 0.8;
    translate([wall - lip_t/2, wall - lip_t/2, shell_d - lip_h])
        difference() {
            rrect(frame_w - wall*2 + lip_t,
                  frame_h - wall*2 + lip_t,
                  lip_h, corner_r - 0.5);
            translate([lip_t, lip_t, -0.1])
                rrect(frame_w - wall*2 - lip_t,
                      frame_h - wall*2 - lip_t,
                      lip_h + 0.2, corner_r - 1.0);
        }

    // ── ESP32 wall brackets (upper half) ──
    // Left bracket wall
    translate([esp_x - bracket_t, esp_y - 1, wall])
        cube([bracket_t, esp_h + 2, bracket_h]);

    // Right bracket wall
    translate([esp_x + esp_w, esp_y - 1, wall])
        cube([bracket_t, esp_h + 2, bracket_h]);

    // Bottom bracket wall (between ESP32 and ribbon area)
    translate([esp_x, esp_y - bracket_t, wall])
        cube([esp_w, bracket_t, bracket_h]);

    // Top bracket wall (with gap in center for wires)
    translate([esp_x, esp_y + esp_h, wall])
        cube([esp_w * 0.3, bracket_t, bracket_h]);
    translate([esp_x + esp_w * 0.7, esp_y + esp_h, wall])
        cube([esp_w * 0.3, bracket_t, bracket_h]);
}

// ═══════════════════════════════════════════════════════════
//  3a. EASEL FRONT — A-frame (two front legs + shelf)
// ═══════════════════════════════════════════════════════════

module easel_front_leg(side) {
    // Single tapered leg from bottom spread to top convergence
    // side: 0 = left, 1 = right
    bot_x = side * (bottom_spread - leg_section);
    top_x = (bottom_spread - top_spread) / 2 + side * (top_spread - leg_section);

    hull() {
        translate([bot_x, 0, 0])
            cube([leg_section, leg_section, 1]);
        translate([top_x, 0, leg_height - 1])
            cube([leg_section, leg_section, 1]);
    }
}

module easel_front() {
    // Two front legs
    easel_front_leg(0);
    easel_front_leg(1);

    // Bottom crossbar / shelf
    translate([0, 0, shelf_h])
        cube([bottom_spread, leg_section, shelf_thick]);

    // Shelf lip (extends FORWARD from the crossbar)
    translate([0, -shelf_lip, shelf_h])
        cube([bottom_spread, shelf_lip + leg_section, shelf_thick / 2]);

    // Small front lip ridge (prevents frame from sliding off)
    translate([0, -shelf_lip, shelf_h])
        cube([bottom_spread, 2, shelf_thick + 3]);

    // Top crossbar connecting the two legs
    top_x_left = (bottom_spread - top_spread) / 2;
    translate([top_x_left, 0, leg_height - leg_section])
        cube([top_spread, leg_section, leg_section]);

    // Peg socket holes for the back leg (in the top crossbar)
    // Two sockets at 1/3 and 2/3 of the top crossbar
    // (these are negative space — we'll subtract them)
}

module easel_front_with_sockets() {
    difference() {
        easel_front();

        // Peg socket in top crossbar (centered)
        top_x_center = bottom_spread / 2;
        translate([top_x_center, leg_section / 2, leg_height - leg_section / 2])
            rotate([0, 0, 0])
                cylinder(h = peg_len + 0.5, r = peg_r + 0.2);
    }
}

// ═══════════════════════════════════════════════════════════
//  3b. EASEL BACK LEG — Single rear support
// ═══════════════════════════════════════════════════════════

module easel_back_leg() {
    union() {
        // Main leg body
        rrect(back_leg_w, back_leg_len, back_leg_d, 1.5);

        // Peg at one end (inserts into front A-frame socket)
        translate([back_leg_w / 2, back_leg_len - 1, back_leg_d / 2])
            rotate([-90, 0, 0])
                cylinder(h = peg_len, r = peg_r);

        // Wider foot at the other end
        hull() {
            translate([0, 0, 0])
                rrect(back_leg_w, 5, back_leg_d, 1.5);
            translate([-3, -2, 0])
                rrect(back_leg_w + 6, 4, back_leg_d, 1.5);
        }
    }
}

// ═══════════════════════════════════════════════════════════
//  ASSEMBLY PREVIEW
// ═══════════════════════════════════════════════════════════

module assembly() {
    // Front frame (display face toward viewer, in XY plane)
    color("WhiteSmoke", 0.9)
        front_frame();

    // Back shell (behind the front frame)
    translate([0, 0, -(back_d + wall)])
        color("LightGray", 0.7)
            back_shell();

    // Ghost display (reference)
    color("DarkSlateGray", 0.3)
        translate([pcb_x + dead_left + overlap,
                   pcb_y + (pcb_h - disp_h)/2 + overlap,
                   -0.3])
            cube([disp_w - overlap*2, disp_h - overlap*2, 0.3]);

    // Easel A-frame (behind the assembled frame)
    easel_offset_x = (frame_w - bottom_spread) / 2;
    easel_offset_z = -(back_d + wall + 2);  // Just behind back shell

    translate([easel_offset_x, -shelf_lip, easel_offset_z])
        rotate([-8, 0, 0])  // Slight tilt — legs lean back
            color("BurlyWood", 0.8)
                easel_front_with_sockets();

    // Back leg (angled backward from top of A-frame)
    back_leg_x = frame_w / 2 - back_leg_w / 2;
    translate([back_leg_x,
               frame_h * 0.8,
               easel_offset_z - 5])
        rotate([55, 0, 0])  // Angled backward
            color("BurlyWood", 0.7)
                easel_back_leg();
}

// ═══════════════════════════════════════════════════════════
//  RENDER
// ═══════════════════════════════════════════════════════════

if (render_part == "front") {
    front_frame();
} else if (render_part == "back") {
    back_shell();
} else if (render_part == "easel_front") {
    // Print lying on its back
    easel_front_with_sockets();
} else if (render_part == "easel_back") {
    // Print flat
    easel_back_leg();
} else {
    // "all" — assembly preview
    assembly();
}
